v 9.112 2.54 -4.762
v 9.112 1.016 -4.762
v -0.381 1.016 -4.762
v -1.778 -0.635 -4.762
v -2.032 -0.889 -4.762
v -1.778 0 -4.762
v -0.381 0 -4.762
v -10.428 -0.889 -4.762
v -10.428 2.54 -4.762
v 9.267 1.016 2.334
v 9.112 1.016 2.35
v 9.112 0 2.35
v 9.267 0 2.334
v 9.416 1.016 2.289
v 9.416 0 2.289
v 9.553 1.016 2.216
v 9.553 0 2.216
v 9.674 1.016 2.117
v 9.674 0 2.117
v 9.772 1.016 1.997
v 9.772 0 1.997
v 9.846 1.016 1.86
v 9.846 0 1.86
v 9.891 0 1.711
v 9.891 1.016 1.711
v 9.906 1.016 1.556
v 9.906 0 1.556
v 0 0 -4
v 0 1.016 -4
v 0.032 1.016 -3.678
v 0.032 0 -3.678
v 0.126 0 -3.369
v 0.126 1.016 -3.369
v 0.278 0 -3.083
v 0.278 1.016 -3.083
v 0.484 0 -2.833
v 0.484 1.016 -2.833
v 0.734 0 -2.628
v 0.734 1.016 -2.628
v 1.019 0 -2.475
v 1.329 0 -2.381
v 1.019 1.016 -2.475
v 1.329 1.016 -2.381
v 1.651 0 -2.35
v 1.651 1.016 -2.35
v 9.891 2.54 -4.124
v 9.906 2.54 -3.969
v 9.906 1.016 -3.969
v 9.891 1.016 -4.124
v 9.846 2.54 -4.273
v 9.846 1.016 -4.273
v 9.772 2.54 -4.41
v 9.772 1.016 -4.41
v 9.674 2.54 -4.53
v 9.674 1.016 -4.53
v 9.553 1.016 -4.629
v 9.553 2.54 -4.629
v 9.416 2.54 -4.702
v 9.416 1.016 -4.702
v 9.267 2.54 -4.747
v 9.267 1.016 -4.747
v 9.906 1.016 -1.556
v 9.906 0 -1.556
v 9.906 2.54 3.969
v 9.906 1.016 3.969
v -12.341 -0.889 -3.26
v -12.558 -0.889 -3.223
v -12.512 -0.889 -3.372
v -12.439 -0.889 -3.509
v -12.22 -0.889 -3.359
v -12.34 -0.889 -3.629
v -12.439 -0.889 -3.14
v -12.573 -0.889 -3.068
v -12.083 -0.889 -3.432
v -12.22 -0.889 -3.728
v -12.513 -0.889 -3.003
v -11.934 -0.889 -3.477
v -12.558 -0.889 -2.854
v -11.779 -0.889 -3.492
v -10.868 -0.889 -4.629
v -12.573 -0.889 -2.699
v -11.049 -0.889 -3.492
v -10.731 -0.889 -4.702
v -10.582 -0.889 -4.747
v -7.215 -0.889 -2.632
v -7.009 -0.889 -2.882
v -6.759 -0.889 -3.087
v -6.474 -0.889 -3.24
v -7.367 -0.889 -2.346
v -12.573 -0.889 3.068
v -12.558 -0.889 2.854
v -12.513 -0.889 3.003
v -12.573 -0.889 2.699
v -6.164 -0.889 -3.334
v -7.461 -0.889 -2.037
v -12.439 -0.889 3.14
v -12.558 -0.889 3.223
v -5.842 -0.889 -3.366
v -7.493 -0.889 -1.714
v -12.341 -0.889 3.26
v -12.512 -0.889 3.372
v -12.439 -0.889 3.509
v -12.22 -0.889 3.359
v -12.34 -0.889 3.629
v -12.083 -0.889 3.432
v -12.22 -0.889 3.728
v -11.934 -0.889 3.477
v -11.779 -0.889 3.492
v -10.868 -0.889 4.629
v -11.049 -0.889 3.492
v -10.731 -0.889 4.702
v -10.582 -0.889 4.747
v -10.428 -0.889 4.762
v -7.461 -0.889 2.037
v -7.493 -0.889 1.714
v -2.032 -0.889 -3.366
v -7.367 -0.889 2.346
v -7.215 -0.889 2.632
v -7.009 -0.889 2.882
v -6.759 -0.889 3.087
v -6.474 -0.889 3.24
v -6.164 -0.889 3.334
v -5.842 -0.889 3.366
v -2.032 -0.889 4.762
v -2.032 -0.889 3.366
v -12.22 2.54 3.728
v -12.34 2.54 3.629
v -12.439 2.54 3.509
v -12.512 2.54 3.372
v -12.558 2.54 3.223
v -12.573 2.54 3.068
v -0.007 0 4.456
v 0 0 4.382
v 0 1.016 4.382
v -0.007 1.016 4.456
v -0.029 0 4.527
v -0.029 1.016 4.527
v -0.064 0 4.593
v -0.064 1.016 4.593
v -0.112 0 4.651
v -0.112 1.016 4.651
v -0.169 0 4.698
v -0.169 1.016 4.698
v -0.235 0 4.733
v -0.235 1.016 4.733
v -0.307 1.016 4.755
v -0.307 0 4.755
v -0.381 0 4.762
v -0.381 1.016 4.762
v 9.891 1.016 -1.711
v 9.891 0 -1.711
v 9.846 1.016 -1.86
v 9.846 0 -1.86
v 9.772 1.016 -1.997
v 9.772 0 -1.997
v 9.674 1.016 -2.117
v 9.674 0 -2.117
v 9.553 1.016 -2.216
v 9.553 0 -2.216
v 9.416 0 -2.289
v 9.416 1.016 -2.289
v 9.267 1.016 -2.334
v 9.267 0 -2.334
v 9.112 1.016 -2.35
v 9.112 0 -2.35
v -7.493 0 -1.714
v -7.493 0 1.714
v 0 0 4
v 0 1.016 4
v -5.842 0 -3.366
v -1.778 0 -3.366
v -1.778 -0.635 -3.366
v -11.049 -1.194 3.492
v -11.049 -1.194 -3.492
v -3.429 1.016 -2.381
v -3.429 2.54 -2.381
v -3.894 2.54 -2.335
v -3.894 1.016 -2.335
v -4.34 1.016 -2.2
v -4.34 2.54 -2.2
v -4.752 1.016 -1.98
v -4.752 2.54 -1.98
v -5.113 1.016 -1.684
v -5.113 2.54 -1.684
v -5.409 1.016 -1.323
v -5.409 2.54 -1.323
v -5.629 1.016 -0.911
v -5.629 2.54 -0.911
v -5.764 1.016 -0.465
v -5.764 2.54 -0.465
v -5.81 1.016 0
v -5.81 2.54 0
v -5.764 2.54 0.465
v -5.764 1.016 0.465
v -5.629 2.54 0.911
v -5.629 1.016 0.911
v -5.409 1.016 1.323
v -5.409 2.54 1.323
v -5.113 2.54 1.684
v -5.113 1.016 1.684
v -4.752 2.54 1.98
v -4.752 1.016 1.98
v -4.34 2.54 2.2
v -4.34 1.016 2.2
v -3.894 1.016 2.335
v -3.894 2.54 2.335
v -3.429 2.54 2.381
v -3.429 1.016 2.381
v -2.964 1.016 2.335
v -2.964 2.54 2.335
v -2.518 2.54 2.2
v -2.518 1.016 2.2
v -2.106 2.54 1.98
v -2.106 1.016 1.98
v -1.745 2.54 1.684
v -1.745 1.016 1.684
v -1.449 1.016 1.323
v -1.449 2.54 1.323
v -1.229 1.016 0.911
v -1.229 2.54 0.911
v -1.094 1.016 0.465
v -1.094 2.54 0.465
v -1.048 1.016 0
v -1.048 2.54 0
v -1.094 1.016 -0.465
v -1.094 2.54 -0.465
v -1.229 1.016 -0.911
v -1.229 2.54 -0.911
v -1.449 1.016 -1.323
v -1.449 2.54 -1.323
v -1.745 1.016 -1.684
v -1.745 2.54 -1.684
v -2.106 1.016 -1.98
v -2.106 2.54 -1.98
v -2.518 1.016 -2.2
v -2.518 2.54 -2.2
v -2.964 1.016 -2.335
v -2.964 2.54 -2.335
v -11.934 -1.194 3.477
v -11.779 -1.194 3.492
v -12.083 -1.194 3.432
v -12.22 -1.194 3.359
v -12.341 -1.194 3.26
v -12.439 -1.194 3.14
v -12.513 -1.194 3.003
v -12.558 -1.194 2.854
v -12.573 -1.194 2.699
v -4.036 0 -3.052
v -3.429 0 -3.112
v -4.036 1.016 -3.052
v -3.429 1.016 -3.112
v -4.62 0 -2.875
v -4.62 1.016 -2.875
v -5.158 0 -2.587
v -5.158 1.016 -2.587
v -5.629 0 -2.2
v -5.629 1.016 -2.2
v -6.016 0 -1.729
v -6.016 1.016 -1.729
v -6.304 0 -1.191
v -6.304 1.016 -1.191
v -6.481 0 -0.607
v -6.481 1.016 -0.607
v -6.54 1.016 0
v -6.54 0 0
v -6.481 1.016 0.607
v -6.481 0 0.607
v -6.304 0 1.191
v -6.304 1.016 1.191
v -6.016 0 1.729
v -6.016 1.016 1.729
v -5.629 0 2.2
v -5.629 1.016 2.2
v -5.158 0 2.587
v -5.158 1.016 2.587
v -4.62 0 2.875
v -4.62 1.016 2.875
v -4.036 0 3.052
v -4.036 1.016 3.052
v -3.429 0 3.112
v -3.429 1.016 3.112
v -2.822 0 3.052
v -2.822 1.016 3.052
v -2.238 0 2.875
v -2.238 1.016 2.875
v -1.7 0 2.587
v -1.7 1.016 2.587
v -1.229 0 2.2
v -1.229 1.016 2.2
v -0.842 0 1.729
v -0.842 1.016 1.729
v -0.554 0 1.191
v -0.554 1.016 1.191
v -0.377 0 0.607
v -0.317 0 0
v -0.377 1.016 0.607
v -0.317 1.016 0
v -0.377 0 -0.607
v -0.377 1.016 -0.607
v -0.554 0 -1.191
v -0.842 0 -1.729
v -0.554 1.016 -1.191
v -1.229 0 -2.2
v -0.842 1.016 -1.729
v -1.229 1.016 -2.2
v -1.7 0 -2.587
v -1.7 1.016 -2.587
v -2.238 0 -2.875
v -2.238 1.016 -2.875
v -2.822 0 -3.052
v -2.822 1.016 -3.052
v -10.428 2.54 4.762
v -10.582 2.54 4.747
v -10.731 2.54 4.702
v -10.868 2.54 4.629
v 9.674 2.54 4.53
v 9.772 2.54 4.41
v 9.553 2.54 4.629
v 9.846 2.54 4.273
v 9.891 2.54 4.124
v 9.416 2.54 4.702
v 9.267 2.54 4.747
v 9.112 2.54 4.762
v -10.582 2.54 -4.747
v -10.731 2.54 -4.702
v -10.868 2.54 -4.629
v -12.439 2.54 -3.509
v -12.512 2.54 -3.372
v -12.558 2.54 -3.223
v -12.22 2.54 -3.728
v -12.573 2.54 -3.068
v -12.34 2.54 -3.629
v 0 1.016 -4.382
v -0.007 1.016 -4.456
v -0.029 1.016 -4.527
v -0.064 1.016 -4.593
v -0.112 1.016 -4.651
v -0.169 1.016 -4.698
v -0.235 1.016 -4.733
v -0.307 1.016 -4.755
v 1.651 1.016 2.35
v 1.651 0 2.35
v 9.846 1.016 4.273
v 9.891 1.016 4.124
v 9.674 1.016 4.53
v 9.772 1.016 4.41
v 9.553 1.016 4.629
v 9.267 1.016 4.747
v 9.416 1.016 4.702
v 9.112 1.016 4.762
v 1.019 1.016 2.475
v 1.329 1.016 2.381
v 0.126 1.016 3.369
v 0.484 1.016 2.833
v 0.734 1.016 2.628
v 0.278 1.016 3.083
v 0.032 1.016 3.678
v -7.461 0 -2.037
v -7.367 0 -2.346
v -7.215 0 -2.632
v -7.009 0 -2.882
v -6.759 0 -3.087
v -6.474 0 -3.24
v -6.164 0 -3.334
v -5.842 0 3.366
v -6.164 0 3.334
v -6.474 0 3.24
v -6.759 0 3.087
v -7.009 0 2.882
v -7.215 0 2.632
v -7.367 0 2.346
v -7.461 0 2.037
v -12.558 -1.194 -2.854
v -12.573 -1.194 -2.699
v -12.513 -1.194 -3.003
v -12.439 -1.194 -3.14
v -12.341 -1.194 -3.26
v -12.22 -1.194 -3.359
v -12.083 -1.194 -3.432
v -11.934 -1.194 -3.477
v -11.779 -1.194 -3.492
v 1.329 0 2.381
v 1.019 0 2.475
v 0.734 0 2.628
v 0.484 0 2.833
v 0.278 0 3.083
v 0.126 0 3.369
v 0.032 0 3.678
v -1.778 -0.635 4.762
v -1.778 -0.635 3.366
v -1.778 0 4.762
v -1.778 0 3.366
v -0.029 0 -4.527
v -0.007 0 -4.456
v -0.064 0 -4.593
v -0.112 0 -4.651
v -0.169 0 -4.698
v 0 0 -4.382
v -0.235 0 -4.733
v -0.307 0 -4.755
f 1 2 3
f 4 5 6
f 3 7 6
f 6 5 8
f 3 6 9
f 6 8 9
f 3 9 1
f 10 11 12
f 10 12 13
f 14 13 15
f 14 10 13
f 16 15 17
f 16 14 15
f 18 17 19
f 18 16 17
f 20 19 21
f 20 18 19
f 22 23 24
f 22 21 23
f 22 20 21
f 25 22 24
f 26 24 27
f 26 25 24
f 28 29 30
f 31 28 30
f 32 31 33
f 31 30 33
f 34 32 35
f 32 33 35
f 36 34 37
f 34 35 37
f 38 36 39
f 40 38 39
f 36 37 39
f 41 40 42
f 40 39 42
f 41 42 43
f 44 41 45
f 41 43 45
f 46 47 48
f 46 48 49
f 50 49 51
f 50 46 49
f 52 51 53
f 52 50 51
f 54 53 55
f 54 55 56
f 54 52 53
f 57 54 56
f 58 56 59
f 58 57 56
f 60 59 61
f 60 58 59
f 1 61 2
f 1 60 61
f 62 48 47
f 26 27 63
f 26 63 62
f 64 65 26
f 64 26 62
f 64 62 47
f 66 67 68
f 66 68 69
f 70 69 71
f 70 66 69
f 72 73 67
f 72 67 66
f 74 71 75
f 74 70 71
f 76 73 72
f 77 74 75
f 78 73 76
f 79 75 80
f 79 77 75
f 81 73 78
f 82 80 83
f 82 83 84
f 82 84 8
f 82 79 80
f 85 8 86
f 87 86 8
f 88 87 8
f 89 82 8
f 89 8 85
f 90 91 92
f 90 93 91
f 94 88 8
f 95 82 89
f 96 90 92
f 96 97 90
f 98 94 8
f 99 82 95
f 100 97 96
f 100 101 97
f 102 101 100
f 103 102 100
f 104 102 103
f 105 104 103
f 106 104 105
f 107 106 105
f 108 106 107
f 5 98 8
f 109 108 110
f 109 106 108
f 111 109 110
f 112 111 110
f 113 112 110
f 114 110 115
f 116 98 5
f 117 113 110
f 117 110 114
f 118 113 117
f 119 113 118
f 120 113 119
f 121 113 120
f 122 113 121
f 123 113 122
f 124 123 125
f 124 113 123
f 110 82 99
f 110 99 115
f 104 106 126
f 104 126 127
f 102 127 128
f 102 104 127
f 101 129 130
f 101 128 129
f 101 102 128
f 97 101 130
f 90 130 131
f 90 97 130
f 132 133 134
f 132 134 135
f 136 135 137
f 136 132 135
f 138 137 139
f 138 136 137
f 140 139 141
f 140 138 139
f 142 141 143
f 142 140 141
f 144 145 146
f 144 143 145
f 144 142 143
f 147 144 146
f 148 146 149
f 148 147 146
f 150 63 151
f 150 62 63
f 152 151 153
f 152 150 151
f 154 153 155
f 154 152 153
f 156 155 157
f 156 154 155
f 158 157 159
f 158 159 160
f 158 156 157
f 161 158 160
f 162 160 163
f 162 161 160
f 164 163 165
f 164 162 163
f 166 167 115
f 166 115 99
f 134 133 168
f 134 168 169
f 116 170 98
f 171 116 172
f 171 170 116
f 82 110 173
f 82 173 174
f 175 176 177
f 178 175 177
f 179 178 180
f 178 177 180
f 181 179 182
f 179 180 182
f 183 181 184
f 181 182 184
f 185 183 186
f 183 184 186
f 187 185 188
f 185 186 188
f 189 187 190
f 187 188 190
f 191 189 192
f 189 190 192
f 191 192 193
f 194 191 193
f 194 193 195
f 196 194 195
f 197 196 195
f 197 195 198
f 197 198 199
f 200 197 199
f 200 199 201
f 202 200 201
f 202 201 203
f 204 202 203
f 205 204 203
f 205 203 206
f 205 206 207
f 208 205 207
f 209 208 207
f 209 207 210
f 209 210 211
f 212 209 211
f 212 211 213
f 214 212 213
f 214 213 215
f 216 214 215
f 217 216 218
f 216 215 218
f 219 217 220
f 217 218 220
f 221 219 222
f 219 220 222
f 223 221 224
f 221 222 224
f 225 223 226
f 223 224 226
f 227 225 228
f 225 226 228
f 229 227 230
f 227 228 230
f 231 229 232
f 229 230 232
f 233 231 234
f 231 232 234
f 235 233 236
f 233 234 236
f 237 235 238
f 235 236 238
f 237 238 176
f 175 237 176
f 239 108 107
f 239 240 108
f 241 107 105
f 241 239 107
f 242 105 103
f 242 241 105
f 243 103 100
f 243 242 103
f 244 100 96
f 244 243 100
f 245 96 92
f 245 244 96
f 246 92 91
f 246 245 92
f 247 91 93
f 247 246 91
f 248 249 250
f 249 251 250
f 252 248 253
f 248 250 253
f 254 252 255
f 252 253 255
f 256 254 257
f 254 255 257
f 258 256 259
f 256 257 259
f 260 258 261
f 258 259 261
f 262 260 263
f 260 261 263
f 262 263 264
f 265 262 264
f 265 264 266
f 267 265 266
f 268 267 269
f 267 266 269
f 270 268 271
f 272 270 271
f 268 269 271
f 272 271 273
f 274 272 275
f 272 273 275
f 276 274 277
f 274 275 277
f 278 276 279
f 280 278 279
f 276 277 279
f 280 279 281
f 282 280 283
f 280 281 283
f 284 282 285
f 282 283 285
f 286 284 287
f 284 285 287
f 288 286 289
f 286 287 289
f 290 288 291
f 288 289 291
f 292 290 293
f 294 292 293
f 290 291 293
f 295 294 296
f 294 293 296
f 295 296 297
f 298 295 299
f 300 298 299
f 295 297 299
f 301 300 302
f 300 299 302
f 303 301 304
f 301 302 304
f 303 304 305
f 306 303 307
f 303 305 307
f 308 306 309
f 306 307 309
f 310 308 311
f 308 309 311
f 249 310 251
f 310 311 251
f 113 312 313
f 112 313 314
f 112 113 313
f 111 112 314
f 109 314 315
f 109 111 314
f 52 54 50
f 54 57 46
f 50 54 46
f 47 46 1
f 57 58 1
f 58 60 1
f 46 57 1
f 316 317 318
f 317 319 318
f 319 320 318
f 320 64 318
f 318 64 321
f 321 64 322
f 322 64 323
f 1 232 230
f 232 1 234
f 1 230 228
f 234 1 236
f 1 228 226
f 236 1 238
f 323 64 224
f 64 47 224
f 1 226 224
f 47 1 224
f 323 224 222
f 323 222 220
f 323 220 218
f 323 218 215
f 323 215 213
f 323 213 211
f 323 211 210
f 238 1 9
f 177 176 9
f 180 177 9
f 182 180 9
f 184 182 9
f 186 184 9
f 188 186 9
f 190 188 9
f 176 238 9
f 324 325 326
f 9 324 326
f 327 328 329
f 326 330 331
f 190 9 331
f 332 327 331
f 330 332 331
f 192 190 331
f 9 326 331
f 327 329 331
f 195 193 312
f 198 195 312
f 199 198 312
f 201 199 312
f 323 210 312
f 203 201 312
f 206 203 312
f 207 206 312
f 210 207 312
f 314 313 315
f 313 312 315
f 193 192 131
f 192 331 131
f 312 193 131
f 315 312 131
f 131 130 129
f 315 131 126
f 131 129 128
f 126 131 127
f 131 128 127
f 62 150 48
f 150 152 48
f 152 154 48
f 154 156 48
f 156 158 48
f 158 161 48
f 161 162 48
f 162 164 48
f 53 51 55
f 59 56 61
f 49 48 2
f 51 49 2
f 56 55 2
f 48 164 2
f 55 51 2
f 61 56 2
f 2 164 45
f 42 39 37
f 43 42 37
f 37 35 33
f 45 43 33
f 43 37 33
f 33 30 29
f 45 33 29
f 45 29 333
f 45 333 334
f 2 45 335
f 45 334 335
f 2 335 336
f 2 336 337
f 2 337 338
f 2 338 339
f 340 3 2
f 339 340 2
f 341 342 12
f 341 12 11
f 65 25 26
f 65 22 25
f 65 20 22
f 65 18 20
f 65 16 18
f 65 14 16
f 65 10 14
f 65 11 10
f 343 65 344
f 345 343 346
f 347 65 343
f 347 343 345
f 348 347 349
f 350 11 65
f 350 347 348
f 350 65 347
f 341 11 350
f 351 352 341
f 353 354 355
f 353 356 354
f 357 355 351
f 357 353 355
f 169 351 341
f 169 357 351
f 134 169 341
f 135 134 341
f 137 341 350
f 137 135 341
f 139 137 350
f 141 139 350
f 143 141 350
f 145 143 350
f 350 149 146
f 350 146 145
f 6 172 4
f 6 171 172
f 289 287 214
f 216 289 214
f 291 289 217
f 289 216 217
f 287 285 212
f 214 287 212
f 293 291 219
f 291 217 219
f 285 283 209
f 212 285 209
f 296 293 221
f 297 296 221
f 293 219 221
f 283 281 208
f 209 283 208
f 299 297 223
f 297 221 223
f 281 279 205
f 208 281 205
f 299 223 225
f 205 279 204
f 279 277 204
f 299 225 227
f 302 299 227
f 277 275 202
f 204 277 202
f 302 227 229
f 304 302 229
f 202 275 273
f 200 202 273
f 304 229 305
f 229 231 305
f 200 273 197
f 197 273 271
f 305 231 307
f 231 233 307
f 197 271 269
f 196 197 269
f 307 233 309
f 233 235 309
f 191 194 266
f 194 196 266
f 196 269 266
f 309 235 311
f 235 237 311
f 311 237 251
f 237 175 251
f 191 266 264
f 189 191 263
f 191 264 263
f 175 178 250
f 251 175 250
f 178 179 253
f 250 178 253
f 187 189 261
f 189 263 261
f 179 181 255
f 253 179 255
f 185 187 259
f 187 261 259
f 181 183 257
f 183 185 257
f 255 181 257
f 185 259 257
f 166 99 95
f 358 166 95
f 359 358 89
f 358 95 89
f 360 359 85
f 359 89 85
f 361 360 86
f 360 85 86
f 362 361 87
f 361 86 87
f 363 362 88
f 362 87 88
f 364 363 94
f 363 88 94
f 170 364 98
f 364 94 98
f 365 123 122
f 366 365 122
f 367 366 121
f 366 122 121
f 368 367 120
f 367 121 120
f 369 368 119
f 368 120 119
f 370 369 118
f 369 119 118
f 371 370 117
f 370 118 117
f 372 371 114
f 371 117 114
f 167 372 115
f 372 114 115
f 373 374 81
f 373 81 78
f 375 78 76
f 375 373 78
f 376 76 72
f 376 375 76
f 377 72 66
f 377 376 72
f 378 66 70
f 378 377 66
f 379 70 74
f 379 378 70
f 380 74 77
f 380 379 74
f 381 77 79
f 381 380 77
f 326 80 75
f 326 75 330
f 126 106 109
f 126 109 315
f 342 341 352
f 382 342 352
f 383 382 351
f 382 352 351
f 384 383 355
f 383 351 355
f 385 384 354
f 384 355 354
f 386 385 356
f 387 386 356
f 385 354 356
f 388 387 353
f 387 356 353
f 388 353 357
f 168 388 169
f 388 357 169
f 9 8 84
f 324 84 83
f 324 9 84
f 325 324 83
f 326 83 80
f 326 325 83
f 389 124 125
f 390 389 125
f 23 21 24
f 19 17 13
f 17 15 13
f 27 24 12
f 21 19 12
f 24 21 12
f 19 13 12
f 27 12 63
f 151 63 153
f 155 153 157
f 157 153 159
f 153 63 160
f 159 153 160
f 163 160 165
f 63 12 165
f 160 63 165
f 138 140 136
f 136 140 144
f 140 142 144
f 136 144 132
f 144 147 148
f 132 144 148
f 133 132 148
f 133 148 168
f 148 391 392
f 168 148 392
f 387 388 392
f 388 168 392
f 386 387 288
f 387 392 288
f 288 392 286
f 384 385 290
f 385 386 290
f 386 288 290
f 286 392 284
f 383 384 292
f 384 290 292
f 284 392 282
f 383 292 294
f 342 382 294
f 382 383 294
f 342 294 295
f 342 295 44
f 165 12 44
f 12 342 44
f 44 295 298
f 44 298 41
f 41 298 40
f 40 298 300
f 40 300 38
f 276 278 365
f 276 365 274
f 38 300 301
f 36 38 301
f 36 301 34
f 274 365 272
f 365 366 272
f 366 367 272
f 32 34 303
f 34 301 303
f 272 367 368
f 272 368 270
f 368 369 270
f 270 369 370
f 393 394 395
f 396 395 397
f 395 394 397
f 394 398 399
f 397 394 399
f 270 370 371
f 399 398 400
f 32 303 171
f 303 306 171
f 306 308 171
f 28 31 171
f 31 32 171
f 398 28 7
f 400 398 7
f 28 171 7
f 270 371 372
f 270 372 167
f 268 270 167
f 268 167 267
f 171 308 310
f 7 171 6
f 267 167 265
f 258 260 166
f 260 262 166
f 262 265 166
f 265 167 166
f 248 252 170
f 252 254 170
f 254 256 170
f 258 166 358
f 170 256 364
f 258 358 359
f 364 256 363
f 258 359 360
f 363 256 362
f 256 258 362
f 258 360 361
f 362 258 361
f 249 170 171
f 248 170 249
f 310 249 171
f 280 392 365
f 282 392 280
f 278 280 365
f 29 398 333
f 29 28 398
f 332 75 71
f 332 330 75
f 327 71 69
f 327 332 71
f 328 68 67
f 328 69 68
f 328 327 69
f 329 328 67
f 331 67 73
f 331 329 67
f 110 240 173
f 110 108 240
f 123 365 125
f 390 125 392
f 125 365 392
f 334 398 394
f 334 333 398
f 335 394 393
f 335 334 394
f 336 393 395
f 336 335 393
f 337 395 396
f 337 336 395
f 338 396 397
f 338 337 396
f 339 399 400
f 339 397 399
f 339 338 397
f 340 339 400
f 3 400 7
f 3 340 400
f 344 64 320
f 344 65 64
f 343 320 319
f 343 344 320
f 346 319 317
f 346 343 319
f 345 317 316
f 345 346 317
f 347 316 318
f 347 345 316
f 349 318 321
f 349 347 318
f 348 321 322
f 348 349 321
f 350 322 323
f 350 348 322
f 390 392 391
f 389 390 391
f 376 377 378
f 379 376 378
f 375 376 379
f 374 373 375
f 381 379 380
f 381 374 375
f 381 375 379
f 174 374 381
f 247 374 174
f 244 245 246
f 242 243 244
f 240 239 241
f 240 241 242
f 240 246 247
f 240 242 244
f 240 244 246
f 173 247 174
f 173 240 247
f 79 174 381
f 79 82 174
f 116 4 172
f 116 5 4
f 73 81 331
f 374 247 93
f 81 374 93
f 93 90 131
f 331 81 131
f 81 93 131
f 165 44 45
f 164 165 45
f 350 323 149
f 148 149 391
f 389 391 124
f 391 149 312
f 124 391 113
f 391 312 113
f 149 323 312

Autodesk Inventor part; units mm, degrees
ref_plane "YZ Plane" through (0, 0, 0) normal (1, 0, 0) x (0, 1, 0)
ref_plane "XZ Plane" through (0, 0, 0) normal (0, 1, 0) x (-1, 0, 0)
ref_plane "XY Plane" through (0, 0, 0) normal (0, 0, 1) x (1, 0, 0)
sketch "Sketch1" plane through (0, 0, 0) normal (1, 0, 0) x (0, 1, 0)
  line L0 (-0.7106, 0) -> (4.2636, 0) projected
  line L1 (0, 6.6675) -> (0, -6.6675) projected
  line L2 (2.54, -4.7625) -> (2.54, 4.7625)
  line L3 (2.54, 4.7625) -> (0, 4.7625)
  line L4 (0, 4.7625) -> (0, -4.7625)
  line L5 (0, -4.7625) -> (2.54, -4.7625)
  line L6 (2.54, -4.7625) -> (0, 4.7625) construction
  line L7 (2.54, 4.7625) -> (0, -4.7625) construction
  line L8 (0, 2.3495) -> (1.016, 2.3495)
  line L9 (1.016, 2.3495) -> (1.016, 4.7625)
  line L10 (0, -2.3495) -> (1.016, -2.3495)
  line L11 (1.016, -2.3495) -> (1.016, -4.7625)
  line L12 (1.27, 0) -> (3.553, 0) construction
  point P0 (0, 0)
  dimension "d0" = 9.525
  dimension "d1" = 2.54
  dimension "d2" = 0
  dimension "d3" = 1.016
  dimension "d4" = 4.699
  dimension "d5" = 2.413
  dimension "d6" = 2.413
extrude "Extrusion1" add sketch "Sketch1" along normal blind 9.906 contours L1 L8 L9 L3 L2 L0 | L0 L2 L5 L11 L10 L1
extrude "Extrusion2" add sketch "Sketch1" against normal blind 12.573
sketch "Sketch2" plane through (0, 0, 0) normal (0, 1, 0) x (-1, 0, 0)
  line L0 (-1.3208, 0) -> (7.9248, 0) projected
  line L1 (0, -4.445) -> (0, 4.445) projected
  point P0 (0, 0)
  point P1 (3.429, 0)
  dimension "d11" = 3.429
hole "Hole1" at (-3.429, 0, 0) direction (0, 1, 0) diameter 4.7625 end through all counterbore diameter 6.223 counterbore depth 1.016
sketch "Sketch3" plane through (9.906, 0, -2.3495) normal (0, -1, 0) x (1, 0, 0)
  line L0 (-22.479, 5.715) -> (-17.399, 5.715)
  line L1 (-17.399, 5.715) -> (-17.399, -1.016)
  line L2 (-17.399, -1.016) -> (-22.479, -1.016)
  line L3 (-22.479, -1.016) -> (-22.479, 5.715)
  line L4 (-34.3558, 2.3495) -> (5.726, 2.3495) projected
  line L5 (-9.906, 9.0932) -> (-9.906, -4.3307) projected
  line L6 (-9.906, 2.3495) -> (-28.6298, 2.3495) construction
  line L7 (-22.479, 7.112) -> (0, 7.112) projected
  line L8 (-22.479, 5.715) -> (-11.684, 5.715)
  line L9 (-11.684, 5.715) -> (-11.684, 7.112)
  line L10 (-11.684, 7.112) -> (-22.479, 7.112)
  line L11 (-22.479, 7.112) -> (-22.479, 5.715)
  line L12 (0, -2.413) -> (-22.479, -2.413) projected
  line L13 (-22.479, -1.016) -> (-11.684, -1.016)
  line L14 (-11.684, -1.016) -> (-11.684, -2.413)
  line L15 (-11.684, -2.413) -> (-22.479, -2.413)
  line L16 (-22.479, -2.413) -> (-22.479, -1.016)
  dimension "d22" = 5.08
  dimension "d30" = 6.731
  dimension "d45" = 10.795
  dimension "d46" = 10.795
extrude "Extrusion3" add sketch "Sketch3" along normal blind 0.889 contours L11 L7 L9 L8 L0 | L0 L1 L4 L3 | L4 L1 L2 L3 | L2 L13 L14 L12 L16
chamfer "Chamfer2" distance 0.254 angle 45 2 edges at (-1.778, -0.889, 4.064) (-1.778, -0.889, -4.064)
fillet "Fillet1" radius 0.7937 4 edges at (9.906, 0.508, 2.3495) (9.906, 0.508, -2.3495) (9.906, 1.778, 4.7625) (9.906, 1.778, -4.7625)
fillet "Fillet2" radius 0.381 2 edges at (0, 0.508, -4.7625) (0, 0.508, 4.7625)
sketch "Sketch4" plane through (0, 0, 0) normal (0, 1, 0) x (-1, 0, 0)
  circle A0 centre (3.429, 0) radius 2.3813 projected
  circle A1 centre (3.429, 0) radius 3.175
  point P0 (0, 0)
  dimension "d34" = 6.35
sketch "Sketch5" plane through (9.906, -0.889, -2.3495) normal (0, -1, 0) x (1, 0, 0)
  line L0 (-26.9748, 2.3495) -> (4.4958, 2.3495) projected
  line L1 (-9.906, 9.017) -> (-9.906, -4.318) projected
  line L2 (-22.479, 7.112) -> (-22.479, -2.413) projected
  line L3 (-20.955, -1.143) -> (-22.479, -1.143)
  line L4 (-22.479, -1.143) -> (-22.479, 5.842)
  line L5 (-22.479, 5.842) -> (-20.955, 5.842)
  line L6 (-20.955, 5.842) -> (-20.955, -1.143)
  line L7 (-20.955, -1.143) -> (-22.479, 5.842) construction
  line L8 (-22.479, -1.143) -> (-20.955, 5.842) construction
  point P0 (-9.906, 2.3495)
  point P1 (-21.717, 2.3495)
  dimension "d47" = 6.985
  dimension "d48" = 1.524
extrude "Extrusion4" add sketch "Sketch5" along normal blind 0.3048
chamfer "Chamfer4" distance 1.27 distance2 1.905 1 edges at (-12.573, 0.8255, -4.7625) measured on face at (-12.573, 1.397, -1.1642)
chamfer "Chamfer5" distance 1.905 distance2 1.27 1 edges at (-12.573, 0.8255, 4.7625) measured on face at (-9.0593, 0.254, 4.7625)
fillet "Fillet4" radius 0.7937 2 edges at (-12.573, -1.0414, -3.4925) (-12.573, -1.0414, 3.4925)
fillet "Fillet5" radius 0.7937 4 edges at (-12.573, 0.8255, 3.4925) (-10.668, 0.8255, 4.7625) (-12.573, 0.8255, -3.4925) (-10.668, 0.8255, -4.7625)
fillet "Fillet6" radius 1.651 4 edges at (0, 0.508, -2.3495) (0, 0.508, 2.3495) (-7.493, -0.4445, 3.3655) (-7.493, -0.4445, -3.3655)
sketch "Sketch6" plane through (0, 0, 0) normal (0, 0, 1) x (1, 0, 0)
  line L0 (-11.049, -1.1938) -> (-11.7793, -1.1938) projected
  line L1 (-11.049, -0.889) -> (-11.049, -1.1938) projected
  line L2 (-2.032, -0.889) -> (-10.4277, -0.889) projected
  line L3 (-11.049, -1.1938) -> (-2.032, -0.889)
  point P0 (0, 0)
  dimension "d51" = 1.936
properties part number "J005044" material "STAINLESS STEEL, 303"
